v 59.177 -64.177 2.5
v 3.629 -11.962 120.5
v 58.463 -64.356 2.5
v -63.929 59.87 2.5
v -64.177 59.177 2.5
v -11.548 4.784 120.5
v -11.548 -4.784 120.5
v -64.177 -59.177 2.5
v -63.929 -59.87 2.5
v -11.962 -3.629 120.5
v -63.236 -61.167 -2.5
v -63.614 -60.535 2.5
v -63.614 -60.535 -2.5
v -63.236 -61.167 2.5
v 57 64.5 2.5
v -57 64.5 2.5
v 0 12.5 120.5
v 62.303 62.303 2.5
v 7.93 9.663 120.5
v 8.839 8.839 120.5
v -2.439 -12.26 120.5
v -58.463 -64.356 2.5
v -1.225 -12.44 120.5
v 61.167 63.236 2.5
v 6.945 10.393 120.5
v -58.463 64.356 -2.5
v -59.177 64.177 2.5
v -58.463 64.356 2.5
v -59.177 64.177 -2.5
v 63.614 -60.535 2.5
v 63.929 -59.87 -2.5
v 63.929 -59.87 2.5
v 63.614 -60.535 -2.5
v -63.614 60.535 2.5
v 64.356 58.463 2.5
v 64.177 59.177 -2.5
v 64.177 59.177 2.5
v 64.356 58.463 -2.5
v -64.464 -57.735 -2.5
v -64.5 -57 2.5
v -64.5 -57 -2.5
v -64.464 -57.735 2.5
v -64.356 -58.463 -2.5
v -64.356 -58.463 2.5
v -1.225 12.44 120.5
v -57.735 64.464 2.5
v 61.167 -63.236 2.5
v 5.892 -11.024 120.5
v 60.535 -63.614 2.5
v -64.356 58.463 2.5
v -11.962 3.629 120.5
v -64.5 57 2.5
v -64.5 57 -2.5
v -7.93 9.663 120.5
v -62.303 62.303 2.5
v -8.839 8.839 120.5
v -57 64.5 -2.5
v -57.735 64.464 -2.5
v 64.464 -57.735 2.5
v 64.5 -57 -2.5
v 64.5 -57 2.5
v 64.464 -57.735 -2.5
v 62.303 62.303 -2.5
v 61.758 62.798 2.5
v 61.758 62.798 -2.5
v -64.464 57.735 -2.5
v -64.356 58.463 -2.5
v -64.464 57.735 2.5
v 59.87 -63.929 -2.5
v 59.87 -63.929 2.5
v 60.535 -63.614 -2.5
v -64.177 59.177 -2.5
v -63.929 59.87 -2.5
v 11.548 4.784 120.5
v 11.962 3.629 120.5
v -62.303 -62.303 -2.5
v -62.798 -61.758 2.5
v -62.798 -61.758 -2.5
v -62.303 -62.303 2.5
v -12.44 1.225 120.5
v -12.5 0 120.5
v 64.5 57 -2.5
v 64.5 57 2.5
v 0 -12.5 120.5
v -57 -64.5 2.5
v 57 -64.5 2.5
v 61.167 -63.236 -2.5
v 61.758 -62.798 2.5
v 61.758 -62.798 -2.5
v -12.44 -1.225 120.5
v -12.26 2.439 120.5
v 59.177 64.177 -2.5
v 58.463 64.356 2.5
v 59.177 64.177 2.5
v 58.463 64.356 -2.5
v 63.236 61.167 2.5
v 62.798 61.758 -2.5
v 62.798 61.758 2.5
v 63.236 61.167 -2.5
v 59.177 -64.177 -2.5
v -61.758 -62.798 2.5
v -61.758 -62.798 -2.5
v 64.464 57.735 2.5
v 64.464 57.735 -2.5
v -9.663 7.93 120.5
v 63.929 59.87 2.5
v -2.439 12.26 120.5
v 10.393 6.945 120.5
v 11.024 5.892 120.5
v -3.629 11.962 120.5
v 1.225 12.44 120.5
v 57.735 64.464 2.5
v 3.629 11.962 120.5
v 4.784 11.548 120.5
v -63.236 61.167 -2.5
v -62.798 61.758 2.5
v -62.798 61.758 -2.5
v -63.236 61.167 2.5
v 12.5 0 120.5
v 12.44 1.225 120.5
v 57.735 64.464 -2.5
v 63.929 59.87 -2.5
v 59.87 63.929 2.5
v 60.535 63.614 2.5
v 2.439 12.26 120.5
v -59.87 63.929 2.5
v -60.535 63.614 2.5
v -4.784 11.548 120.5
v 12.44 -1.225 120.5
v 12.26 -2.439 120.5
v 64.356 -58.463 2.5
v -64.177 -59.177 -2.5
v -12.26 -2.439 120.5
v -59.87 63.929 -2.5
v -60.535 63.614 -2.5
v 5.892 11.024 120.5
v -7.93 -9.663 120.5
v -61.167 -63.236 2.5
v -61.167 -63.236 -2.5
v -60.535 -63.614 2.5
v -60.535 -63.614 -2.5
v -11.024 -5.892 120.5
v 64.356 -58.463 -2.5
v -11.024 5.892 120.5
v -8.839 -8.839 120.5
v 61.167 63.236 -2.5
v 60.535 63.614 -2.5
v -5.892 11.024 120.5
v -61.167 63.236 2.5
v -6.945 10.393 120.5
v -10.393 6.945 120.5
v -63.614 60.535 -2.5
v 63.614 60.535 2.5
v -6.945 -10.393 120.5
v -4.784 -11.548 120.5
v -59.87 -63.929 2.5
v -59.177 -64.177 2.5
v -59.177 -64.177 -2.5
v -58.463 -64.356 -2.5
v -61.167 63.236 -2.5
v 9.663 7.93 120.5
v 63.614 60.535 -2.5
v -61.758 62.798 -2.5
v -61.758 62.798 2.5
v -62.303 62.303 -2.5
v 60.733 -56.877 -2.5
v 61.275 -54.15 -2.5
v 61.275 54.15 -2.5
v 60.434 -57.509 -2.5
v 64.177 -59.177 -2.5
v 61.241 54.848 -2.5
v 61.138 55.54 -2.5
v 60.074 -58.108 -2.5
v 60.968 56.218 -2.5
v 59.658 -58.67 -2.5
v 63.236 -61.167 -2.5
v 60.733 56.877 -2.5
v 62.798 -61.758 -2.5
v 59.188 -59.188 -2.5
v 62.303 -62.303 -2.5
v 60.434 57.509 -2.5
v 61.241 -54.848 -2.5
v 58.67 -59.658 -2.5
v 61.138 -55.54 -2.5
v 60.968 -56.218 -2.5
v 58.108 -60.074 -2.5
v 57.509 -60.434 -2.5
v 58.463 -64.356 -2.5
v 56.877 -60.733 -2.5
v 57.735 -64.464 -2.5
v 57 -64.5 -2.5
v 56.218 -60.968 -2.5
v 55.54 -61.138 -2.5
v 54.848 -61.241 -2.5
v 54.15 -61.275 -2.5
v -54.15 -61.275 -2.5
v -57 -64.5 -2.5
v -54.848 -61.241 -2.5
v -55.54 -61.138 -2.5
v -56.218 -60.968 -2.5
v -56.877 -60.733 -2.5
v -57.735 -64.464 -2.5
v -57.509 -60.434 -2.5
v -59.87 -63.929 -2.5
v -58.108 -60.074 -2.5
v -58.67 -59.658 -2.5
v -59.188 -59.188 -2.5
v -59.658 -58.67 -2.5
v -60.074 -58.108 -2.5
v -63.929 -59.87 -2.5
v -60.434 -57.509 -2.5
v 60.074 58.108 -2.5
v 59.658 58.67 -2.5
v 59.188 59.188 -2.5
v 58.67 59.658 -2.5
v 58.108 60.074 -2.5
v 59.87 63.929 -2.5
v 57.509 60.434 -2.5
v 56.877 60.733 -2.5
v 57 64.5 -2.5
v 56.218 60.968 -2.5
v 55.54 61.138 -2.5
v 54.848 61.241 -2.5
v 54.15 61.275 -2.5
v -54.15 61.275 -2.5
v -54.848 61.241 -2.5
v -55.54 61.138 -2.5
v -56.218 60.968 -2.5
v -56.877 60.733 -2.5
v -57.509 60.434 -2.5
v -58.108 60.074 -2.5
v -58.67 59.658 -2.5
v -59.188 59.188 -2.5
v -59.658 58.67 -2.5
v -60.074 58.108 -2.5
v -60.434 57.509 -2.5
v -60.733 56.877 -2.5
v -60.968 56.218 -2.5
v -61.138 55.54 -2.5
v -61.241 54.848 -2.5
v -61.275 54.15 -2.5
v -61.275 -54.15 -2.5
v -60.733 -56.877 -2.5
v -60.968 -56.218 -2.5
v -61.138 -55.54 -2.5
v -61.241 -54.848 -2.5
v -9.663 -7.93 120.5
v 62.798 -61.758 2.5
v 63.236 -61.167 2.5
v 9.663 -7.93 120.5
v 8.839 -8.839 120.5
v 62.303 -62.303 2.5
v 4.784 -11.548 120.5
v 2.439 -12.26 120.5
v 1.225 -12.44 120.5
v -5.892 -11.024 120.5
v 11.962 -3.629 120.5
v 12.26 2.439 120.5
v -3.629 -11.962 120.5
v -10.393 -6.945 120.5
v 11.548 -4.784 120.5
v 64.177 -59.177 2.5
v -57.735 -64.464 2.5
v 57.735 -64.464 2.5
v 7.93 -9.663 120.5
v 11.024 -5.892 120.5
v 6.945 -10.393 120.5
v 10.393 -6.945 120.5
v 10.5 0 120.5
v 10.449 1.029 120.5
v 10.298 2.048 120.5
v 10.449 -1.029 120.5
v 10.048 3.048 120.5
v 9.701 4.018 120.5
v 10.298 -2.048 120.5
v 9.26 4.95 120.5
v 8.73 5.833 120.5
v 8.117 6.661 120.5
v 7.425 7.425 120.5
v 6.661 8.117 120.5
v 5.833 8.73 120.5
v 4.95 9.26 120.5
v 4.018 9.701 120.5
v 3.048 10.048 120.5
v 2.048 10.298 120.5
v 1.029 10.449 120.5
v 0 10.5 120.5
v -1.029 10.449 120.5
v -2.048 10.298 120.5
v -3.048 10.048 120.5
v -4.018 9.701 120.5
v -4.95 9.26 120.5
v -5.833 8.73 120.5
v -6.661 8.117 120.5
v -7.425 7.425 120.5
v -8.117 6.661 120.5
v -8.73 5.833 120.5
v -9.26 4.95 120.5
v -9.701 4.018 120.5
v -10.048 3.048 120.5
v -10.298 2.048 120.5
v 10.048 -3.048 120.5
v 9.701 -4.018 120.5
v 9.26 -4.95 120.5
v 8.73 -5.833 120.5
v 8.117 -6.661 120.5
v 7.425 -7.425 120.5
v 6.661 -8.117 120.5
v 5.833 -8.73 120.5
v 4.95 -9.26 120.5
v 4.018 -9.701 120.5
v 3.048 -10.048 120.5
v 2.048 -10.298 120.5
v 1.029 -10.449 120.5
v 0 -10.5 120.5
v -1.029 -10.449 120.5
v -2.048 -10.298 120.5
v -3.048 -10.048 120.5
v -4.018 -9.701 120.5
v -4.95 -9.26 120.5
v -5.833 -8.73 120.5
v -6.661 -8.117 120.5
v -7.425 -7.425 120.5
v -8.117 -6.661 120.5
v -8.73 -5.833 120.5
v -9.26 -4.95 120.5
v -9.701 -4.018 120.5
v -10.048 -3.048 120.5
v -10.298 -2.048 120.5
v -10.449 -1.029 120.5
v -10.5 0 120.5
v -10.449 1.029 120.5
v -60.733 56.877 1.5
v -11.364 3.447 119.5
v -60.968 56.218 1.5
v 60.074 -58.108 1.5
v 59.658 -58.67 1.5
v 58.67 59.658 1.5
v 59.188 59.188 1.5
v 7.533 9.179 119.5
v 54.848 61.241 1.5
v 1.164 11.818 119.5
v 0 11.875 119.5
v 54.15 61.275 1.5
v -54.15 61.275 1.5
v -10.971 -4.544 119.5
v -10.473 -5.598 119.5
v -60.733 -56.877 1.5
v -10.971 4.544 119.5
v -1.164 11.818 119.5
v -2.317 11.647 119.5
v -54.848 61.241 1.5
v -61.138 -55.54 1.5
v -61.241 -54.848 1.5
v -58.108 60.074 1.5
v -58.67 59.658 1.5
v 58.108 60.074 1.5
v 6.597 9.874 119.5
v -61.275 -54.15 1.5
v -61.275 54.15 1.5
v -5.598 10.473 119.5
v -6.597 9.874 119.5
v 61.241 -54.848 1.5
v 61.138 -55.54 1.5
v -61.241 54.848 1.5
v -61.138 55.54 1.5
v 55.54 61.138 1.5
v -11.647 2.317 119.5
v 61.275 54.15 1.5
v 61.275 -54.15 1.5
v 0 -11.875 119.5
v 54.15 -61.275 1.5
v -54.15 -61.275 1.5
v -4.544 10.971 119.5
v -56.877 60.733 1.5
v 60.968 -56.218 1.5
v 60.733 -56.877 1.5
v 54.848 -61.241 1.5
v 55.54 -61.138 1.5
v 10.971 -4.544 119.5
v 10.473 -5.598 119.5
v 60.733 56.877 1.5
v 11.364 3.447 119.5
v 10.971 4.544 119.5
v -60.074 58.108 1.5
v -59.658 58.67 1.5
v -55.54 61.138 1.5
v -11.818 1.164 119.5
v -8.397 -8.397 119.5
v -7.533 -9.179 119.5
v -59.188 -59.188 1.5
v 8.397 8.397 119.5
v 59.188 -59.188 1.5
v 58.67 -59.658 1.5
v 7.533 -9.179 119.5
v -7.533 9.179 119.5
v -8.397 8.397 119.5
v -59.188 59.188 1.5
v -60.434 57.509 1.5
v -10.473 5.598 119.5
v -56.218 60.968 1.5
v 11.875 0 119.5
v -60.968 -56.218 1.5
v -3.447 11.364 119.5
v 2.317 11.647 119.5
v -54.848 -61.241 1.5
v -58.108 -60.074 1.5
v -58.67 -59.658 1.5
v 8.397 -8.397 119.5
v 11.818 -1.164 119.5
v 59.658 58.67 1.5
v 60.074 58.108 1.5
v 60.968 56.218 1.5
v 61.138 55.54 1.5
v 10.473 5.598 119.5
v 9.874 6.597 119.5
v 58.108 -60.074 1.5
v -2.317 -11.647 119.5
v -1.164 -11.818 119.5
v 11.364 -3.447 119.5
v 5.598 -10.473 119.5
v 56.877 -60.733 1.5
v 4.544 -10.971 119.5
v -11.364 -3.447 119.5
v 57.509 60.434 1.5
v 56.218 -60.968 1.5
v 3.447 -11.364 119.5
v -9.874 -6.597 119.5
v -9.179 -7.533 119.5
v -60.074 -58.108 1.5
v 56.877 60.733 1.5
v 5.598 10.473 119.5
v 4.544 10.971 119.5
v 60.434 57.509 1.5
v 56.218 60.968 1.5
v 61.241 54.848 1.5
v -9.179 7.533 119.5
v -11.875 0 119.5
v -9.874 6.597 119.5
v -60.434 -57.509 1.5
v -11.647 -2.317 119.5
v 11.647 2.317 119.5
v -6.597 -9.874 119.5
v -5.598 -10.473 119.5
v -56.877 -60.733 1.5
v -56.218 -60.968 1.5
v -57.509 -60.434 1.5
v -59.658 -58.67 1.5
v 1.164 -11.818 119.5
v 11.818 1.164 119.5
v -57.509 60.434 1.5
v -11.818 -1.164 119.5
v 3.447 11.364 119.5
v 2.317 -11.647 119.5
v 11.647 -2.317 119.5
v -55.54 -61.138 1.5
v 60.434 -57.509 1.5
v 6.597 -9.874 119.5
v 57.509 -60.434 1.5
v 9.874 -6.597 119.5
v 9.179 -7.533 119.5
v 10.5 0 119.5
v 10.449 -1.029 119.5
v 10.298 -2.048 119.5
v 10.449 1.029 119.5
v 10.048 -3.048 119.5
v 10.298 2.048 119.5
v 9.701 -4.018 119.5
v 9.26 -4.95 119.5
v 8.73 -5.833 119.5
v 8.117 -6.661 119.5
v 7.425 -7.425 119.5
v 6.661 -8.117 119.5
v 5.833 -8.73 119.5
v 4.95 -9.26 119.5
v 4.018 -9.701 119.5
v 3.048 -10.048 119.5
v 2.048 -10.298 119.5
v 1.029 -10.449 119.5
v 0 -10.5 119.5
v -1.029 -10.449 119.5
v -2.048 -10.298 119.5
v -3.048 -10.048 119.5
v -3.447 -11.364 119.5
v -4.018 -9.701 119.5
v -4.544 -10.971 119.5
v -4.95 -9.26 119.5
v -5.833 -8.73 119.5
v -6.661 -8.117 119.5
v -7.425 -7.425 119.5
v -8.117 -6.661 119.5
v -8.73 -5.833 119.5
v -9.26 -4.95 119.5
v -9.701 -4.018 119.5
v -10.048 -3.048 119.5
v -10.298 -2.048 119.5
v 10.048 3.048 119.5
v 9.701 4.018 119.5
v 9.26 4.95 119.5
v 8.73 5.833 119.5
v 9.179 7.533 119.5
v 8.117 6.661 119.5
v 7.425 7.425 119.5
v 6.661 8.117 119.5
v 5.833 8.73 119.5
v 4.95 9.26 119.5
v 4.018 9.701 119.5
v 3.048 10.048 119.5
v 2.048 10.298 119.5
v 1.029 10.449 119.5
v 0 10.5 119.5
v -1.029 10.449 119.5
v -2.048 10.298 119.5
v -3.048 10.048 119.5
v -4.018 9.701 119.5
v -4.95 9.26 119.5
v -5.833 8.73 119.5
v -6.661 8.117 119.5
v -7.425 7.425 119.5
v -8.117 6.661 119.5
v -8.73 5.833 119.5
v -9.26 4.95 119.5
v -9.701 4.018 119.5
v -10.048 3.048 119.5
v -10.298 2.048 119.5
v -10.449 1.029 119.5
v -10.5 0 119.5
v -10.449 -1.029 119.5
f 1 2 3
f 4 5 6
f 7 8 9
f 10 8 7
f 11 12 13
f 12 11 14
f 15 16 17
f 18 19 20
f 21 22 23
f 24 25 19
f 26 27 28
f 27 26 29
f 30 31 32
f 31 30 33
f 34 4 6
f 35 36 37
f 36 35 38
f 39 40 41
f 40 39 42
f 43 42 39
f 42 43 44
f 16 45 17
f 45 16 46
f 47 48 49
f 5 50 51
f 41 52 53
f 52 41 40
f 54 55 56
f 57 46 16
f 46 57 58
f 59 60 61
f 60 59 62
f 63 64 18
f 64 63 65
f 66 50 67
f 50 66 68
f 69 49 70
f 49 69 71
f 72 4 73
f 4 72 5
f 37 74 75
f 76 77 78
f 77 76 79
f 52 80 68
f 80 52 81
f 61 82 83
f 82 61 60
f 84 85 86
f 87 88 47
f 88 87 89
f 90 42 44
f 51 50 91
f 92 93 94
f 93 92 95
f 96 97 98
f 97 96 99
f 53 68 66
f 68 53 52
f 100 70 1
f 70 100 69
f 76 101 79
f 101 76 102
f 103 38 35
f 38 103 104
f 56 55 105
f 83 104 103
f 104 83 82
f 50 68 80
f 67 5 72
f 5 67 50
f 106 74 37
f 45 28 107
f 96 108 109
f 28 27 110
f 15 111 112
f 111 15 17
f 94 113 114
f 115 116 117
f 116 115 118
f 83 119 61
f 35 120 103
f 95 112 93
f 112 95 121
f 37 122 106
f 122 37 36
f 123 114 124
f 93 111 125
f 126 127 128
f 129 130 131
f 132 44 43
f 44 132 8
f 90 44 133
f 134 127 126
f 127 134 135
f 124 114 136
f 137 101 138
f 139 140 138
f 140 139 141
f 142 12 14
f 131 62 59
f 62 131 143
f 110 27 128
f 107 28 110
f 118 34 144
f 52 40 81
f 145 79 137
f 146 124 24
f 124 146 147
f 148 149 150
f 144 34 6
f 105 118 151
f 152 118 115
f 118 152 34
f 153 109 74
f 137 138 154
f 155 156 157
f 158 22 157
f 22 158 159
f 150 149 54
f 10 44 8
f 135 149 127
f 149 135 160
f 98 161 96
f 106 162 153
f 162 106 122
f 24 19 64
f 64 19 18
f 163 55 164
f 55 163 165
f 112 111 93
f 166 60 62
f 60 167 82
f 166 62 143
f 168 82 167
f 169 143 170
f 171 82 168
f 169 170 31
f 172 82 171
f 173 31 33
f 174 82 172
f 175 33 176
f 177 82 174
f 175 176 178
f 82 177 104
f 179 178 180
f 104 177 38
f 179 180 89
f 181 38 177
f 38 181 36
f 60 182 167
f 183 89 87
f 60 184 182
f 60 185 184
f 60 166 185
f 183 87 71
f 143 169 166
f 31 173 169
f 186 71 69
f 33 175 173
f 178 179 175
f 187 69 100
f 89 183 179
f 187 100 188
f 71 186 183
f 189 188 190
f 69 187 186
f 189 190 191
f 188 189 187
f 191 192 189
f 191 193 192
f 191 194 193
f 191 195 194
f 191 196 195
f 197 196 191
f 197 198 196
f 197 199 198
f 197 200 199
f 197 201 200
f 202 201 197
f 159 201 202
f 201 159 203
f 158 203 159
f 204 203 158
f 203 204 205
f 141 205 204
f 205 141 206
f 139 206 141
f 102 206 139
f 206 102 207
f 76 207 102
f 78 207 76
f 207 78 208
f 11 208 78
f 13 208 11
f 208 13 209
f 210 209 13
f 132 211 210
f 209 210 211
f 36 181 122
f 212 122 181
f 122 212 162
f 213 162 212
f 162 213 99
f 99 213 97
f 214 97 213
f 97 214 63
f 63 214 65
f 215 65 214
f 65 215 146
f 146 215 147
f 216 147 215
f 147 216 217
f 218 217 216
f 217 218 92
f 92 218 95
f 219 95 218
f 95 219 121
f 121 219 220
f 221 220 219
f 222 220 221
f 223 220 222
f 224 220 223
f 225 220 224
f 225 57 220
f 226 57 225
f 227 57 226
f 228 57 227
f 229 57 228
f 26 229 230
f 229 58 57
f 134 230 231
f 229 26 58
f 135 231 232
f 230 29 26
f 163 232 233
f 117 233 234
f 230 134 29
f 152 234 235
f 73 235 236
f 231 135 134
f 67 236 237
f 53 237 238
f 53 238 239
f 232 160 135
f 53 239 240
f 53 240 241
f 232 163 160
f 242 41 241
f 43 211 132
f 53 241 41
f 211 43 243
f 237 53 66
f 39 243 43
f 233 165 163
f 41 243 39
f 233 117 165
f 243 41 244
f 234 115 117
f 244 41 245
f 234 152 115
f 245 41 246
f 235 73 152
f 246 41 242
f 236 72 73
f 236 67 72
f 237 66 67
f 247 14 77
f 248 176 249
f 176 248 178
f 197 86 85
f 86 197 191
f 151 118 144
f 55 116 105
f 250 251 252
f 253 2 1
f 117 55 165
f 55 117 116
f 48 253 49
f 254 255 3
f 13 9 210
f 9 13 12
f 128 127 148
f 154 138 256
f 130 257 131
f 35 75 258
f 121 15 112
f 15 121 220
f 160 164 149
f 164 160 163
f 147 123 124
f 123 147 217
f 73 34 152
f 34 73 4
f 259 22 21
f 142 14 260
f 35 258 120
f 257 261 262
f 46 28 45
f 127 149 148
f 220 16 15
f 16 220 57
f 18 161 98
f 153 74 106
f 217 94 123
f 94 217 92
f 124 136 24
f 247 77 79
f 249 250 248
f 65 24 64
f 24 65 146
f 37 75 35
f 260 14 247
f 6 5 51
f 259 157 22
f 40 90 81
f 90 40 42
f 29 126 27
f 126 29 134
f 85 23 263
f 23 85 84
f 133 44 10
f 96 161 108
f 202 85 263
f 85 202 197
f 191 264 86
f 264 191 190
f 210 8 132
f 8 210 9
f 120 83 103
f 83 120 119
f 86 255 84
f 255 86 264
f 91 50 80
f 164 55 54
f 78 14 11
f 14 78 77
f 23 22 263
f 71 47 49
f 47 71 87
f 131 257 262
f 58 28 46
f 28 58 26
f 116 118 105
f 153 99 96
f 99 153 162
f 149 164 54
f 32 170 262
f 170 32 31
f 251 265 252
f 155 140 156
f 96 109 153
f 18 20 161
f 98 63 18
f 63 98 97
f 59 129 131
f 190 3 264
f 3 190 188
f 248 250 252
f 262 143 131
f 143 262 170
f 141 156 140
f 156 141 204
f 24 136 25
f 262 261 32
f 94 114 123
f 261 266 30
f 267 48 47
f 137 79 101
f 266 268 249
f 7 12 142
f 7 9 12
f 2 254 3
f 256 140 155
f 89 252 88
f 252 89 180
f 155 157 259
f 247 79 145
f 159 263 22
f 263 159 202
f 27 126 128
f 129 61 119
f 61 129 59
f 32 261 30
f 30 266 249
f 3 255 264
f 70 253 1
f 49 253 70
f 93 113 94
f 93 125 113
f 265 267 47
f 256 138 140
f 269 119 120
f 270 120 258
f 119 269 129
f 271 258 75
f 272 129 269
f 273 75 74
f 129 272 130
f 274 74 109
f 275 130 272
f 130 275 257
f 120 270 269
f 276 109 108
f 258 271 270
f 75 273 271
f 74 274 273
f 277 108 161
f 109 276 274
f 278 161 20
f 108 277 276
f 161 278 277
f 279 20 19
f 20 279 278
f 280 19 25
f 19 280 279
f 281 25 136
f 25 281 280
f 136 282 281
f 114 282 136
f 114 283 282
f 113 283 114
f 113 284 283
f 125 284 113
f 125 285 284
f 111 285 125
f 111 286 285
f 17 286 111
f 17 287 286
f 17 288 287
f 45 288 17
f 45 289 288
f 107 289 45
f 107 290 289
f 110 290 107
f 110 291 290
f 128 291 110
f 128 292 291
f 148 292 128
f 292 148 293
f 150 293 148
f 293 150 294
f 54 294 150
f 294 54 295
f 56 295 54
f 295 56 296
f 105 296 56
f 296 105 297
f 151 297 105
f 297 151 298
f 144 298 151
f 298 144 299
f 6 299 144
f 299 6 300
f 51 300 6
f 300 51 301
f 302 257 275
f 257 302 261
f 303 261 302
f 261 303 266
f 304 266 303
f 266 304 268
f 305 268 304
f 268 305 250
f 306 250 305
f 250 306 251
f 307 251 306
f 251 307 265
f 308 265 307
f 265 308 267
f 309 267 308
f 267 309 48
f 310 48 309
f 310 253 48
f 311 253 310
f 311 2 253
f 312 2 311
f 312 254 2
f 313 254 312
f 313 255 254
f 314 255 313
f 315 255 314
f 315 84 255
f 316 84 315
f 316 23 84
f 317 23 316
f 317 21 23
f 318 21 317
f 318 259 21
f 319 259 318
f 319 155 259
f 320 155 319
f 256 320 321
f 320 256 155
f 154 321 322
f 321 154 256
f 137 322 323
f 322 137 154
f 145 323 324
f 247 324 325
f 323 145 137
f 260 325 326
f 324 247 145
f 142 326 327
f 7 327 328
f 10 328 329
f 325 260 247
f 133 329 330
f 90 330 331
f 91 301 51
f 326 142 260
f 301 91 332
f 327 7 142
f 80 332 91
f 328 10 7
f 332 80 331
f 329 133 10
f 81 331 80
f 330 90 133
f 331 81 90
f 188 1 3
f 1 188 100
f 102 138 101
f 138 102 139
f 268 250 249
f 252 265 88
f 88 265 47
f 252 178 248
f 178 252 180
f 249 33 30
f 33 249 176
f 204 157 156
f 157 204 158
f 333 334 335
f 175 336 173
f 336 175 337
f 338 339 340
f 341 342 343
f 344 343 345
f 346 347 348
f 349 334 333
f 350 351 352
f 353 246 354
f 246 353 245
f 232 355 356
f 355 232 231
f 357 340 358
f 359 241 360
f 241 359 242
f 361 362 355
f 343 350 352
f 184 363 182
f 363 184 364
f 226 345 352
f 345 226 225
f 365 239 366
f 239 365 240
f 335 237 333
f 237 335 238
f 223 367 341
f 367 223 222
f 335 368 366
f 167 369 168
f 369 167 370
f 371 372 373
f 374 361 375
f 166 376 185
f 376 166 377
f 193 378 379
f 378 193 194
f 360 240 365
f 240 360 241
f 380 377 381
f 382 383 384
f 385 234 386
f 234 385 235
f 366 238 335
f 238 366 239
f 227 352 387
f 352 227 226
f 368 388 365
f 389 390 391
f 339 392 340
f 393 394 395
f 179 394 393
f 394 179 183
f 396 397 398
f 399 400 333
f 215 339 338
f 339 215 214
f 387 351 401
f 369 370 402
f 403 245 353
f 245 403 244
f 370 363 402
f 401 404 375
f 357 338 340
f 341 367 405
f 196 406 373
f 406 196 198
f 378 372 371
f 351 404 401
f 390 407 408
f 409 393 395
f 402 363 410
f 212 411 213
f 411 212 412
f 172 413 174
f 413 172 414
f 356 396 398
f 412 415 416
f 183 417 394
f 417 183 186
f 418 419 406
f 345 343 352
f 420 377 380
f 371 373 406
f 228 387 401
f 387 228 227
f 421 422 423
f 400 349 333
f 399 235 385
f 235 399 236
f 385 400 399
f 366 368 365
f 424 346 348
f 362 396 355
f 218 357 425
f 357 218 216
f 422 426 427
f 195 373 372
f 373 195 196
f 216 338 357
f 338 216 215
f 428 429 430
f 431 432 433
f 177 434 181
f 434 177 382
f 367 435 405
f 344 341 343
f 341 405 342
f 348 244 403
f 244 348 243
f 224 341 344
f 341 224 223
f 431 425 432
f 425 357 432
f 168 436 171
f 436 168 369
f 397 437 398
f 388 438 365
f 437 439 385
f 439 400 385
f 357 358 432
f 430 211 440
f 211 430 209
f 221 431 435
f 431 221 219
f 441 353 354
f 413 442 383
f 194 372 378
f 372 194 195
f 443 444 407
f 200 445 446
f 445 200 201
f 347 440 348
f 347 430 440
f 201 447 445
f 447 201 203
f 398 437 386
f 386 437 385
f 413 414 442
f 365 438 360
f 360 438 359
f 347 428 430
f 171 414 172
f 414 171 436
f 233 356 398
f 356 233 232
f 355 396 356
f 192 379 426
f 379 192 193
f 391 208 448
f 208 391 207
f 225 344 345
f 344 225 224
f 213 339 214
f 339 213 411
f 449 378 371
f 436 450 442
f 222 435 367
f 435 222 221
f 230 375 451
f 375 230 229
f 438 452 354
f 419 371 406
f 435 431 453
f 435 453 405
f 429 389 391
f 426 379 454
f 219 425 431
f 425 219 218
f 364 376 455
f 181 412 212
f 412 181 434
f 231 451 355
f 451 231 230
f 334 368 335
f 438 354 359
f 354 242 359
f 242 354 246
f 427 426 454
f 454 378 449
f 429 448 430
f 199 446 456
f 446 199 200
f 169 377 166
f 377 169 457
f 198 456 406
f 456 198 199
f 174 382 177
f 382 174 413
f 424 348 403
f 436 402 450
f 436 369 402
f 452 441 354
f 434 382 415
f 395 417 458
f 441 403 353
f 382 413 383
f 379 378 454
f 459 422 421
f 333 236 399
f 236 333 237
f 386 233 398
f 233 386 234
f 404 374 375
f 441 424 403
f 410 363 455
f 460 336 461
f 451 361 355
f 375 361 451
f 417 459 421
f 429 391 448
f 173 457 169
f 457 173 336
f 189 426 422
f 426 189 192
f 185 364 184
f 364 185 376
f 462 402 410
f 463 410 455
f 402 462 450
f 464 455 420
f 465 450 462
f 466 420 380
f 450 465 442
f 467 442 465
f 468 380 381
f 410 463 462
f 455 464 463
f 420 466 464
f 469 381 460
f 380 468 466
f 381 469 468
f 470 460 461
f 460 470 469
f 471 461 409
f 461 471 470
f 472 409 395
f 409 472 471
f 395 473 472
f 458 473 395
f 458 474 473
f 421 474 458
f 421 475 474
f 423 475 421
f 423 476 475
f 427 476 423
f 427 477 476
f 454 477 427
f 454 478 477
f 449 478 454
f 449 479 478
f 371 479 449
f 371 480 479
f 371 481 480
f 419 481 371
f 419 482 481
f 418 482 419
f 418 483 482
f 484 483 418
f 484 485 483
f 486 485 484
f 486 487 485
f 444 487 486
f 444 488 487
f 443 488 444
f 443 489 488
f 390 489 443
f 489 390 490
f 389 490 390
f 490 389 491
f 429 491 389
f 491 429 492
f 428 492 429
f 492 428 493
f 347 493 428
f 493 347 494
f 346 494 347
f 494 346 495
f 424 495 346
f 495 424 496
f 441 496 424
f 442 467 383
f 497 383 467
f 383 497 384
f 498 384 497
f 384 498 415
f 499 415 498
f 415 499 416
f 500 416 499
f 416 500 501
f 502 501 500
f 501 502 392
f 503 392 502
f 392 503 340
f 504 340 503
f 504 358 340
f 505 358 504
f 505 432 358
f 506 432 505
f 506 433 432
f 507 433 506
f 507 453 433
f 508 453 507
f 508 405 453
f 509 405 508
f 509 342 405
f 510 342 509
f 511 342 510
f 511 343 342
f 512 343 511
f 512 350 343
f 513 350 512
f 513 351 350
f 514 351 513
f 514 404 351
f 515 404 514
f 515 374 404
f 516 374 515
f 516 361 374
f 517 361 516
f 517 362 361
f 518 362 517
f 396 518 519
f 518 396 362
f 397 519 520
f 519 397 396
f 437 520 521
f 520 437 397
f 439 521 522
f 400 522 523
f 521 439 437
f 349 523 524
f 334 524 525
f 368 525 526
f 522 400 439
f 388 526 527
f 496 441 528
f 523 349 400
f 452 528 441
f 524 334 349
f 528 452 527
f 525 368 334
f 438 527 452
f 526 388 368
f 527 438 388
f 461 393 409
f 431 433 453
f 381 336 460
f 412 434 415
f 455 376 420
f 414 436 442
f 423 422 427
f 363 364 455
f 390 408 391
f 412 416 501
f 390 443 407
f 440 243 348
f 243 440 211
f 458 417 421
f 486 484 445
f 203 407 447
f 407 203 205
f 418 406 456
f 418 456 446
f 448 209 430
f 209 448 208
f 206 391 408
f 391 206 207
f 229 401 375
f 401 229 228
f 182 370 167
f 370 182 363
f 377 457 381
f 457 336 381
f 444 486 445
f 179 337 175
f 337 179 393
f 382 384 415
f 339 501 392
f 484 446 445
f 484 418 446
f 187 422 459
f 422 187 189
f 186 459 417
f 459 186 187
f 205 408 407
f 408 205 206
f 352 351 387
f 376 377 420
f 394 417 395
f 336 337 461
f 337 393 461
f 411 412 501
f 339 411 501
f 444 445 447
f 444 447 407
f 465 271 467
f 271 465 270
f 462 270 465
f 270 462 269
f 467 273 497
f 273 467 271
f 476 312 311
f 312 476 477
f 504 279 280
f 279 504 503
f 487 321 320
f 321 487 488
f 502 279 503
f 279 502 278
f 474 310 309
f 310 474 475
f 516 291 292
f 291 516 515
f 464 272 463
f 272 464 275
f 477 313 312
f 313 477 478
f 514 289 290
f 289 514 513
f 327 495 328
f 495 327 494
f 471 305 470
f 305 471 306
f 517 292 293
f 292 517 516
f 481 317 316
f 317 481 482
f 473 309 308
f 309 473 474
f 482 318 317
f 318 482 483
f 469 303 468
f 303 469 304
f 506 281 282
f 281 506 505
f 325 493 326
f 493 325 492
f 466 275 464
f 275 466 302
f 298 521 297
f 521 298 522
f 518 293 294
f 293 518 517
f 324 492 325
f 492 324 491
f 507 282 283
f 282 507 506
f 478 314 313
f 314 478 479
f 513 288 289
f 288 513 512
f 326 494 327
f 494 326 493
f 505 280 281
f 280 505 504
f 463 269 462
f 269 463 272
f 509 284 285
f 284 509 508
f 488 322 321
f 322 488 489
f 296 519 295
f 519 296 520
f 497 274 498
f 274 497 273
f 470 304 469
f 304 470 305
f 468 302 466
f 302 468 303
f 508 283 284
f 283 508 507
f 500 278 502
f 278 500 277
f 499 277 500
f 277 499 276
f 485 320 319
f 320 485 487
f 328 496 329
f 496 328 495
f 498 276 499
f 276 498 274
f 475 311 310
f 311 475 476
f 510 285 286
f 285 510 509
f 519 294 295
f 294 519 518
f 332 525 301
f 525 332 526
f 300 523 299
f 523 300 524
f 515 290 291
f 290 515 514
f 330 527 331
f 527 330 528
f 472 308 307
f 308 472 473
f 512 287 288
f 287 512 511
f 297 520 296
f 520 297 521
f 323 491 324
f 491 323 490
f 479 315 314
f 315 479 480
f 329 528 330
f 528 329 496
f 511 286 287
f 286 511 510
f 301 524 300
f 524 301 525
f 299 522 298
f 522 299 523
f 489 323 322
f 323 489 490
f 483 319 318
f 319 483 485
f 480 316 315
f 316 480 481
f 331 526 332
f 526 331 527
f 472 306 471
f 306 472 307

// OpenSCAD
$fn=64;
round_corner = 15;

nozzle_kit();

module nozzle_kit() {
    difference() {
        nozzle();
        translate([0,0,-1])
        scale([0.95, 0.95, 1])
        color("red")
        nozzle();
        translate([0,0,120])
        cylinder(d=25-4, h=15, center = true);
    }
}
module nozzle(){
    hull() {
        frame_square();
        translate([0, 0, 120])
        frame_ring();
    }
}

module frame_ring() {
    difference() {
        cylinder(d=25, h=1, center = true);
        color("red")
        cylinder(d=25-6, h=6, center = true);
    }
}

module frame_square() {
    difference() {
        square_plate();
        translate([0, 0, 1])
        color("red")
        scale([0.95, 0.95, 4])
        square_plate();
    }
}

module square_plate(){ 
    hull() {
        //cube([129-round_corner, 129, 1], center = true);
        translate([129/2-round_corner/2, 129/2-round_corner/2, 0])
        color("red")
        cylinder(d = round_corner, h = 5, center = true);
        
        mirror([1, 0, 0])
        translate([129/2-round_corner/2, 129/2-round_corner/2, 0])
        color("red")
        cylinder(d = round_corner, h = 5, center = true);
        
        mirror([0, 1, 0])
        translate([129/2-round_corner/2, 129/2-round_corner/2, 0])
        color("red")
        cylinder(d = round_corner, h = 5, center = true);
        
        mirror([1, 1, 0])
        translate([129/2-round_corner/2, 129/2-round_corner/2, 0])
        color("red")
        cylinder(d = round_corner, h = 5, center = true);
    }
}
